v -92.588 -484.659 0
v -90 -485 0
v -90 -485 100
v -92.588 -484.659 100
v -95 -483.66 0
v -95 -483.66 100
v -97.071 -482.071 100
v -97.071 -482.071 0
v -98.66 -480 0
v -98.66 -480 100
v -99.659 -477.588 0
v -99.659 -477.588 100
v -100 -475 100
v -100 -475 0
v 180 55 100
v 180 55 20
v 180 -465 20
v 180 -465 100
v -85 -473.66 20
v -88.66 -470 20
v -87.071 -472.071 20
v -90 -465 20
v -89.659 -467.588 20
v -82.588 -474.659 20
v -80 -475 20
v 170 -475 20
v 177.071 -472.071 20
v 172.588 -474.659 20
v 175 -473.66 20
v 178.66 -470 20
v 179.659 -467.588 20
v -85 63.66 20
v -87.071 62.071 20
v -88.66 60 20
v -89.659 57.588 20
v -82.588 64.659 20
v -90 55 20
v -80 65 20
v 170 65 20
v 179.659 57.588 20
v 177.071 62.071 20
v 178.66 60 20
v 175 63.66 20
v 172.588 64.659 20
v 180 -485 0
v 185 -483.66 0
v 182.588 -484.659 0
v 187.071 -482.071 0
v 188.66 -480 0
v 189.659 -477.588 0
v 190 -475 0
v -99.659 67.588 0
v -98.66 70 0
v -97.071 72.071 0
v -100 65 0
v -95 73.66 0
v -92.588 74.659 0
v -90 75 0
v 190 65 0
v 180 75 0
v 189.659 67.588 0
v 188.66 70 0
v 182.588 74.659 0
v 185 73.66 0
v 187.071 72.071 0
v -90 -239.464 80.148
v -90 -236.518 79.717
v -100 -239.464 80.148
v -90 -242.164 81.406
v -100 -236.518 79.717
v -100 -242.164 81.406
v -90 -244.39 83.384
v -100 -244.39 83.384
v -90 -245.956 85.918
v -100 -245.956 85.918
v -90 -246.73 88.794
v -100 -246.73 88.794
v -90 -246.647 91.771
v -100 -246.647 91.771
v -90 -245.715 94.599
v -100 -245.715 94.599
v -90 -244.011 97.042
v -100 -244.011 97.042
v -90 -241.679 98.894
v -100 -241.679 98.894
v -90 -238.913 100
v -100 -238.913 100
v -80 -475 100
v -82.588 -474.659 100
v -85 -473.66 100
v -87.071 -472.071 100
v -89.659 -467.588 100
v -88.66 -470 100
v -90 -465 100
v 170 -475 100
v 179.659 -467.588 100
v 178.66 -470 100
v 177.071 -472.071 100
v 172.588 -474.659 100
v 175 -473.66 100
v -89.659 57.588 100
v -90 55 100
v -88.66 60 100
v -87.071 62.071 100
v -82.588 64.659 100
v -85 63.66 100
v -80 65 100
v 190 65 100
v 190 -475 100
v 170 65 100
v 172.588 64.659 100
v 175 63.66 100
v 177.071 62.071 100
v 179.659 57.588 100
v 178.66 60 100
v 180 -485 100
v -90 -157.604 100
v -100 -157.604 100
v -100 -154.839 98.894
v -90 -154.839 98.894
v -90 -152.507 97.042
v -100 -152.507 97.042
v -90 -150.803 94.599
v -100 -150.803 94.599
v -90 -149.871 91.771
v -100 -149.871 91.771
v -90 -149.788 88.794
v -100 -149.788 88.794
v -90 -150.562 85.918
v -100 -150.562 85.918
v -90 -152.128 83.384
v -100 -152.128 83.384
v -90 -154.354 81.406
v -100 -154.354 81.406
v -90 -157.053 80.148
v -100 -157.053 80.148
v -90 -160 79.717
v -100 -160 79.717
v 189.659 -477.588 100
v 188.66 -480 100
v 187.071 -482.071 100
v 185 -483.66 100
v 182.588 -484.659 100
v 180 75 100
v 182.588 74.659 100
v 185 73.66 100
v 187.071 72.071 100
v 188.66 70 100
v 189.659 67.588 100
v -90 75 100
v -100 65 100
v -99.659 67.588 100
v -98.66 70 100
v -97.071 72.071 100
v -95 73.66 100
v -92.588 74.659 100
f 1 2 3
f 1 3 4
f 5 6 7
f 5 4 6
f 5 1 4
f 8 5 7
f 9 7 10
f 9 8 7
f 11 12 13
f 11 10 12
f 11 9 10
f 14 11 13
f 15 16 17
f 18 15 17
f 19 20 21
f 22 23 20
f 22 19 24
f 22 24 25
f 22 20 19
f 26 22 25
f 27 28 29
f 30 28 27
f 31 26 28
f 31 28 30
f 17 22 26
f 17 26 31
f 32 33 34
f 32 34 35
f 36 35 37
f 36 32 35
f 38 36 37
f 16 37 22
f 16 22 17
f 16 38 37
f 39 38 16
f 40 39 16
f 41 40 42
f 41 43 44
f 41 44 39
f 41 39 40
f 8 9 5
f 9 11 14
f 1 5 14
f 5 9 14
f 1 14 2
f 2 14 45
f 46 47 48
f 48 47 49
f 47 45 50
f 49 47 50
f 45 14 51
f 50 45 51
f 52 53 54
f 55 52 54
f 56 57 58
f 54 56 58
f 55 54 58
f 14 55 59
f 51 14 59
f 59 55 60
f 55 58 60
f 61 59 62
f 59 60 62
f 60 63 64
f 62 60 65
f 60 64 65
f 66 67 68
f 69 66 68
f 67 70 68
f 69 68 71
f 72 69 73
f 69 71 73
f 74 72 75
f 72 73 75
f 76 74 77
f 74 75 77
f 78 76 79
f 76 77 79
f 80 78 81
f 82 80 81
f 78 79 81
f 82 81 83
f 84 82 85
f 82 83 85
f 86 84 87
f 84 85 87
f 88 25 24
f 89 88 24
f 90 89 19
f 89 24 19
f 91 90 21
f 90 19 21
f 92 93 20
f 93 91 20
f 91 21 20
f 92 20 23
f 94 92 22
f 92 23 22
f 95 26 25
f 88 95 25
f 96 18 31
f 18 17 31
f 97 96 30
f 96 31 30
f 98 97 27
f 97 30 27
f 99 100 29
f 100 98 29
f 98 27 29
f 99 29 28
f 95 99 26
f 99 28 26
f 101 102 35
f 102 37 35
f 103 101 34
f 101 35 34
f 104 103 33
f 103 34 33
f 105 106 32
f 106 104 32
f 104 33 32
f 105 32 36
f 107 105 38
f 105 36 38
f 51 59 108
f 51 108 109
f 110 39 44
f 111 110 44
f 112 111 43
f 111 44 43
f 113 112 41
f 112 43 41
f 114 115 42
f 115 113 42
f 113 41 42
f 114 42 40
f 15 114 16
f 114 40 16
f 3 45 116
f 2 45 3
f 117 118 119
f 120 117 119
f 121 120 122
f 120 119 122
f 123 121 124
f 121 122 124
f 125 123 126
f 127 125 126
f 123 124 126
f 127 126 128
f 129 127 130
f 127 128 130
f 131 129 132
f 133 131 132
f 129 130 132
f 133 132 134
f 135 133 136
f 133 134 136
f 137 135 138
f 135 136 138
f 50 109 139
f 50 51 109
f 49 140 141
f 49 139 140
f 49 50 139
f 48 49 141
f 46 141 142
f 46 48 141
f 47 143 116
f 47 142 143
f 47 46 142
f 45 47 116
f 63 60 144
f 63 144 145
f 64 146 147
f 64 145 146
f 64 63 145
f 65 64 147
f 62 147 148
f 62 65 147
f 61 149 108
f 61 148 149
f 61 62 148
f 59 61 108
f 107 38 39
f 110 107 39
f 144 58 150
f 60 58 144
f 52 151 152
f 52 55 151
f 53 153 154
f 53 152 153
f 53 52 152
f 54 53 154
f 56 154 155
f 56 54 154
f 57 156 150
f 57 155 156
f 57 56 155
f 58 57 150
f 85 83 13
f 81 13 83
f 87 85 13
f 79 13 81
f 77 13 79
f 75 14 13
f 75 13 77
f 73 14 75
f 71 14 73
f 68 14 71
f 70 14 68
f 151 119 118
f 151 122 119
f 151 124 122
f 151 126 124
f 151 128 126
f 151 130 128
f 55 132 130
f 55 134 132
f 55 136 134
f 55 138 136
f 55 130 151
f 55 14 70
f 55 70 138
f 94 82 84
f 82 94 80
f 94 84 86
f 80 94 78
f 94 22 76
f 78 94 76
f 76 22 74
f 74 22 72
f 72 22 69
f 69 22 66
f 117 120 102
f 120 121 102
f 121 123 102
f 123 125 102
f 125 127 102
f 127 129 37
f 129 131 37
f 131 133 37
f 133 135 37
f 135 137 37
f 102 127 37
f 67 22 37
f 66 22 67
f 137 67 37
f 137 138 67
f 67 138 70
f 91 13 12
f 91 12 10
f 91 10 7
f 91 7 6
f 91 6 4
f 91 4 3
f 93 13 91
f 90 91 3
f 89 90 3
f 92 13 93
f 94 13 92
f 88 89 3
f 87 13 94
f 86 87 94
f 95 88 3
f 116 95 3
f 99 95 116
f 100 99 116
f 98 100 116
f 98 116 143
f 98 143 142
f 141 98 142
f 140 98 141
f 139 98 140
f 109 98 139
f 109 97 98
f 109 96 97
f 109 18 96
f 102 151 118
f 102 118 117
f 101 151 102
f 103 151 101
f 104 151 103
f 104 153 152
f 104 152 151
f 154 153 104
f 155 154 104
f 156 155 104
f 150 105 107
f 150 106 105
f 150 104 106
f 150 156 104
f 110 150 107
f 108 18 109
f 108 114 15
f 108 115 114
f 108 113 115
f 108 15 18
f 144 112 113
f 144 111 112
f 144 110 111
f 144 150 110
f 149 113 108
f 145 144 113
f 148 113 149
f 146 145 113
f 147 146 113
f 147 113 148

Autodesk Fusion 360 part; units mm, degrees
sketch "Sketch1" plane through (0, 0, 0) normal (0, 0, 1) x (1, 0, 0)
  line L0 (-90, 75) -> (180, 75)
  line L1 (190, 65) -> (190, -475)
  line L2 (180, -485) -> (-90, -485)
  line L3 (-100, -475) -> (-100, 65)
  line L4 (170, -475) -> (-80, -475)
  line L5 (-90, -465) -> (-90, 55)
  line L6 (-80, 65) -> (170, 65)
  line L7 (180, 55) -> (180, -465)
  arc A0 (190, 65) -> (180, 75) centre (180, 65) ccw
  arc A1 (180, 55) -> (170, 65) centre (170, 55) ccw
  arc A2 (-80, 65) -> (-90, 55) centre (-80, 55) ccw
  arc A3 (180, -485) -> (190, -475) centre (180, -475) ccw
  arc A4 (-90, 75) -> (-100, 65) centre (-90, 65) ccw
  arc A5 (170, -475) -> (180, -465) centre (170, -465) ccw
  arc A6 (-90, -465) -> (-80, -475) centre (-80, -465) ccw
  arc A7 (-100, -475) -> (-90, -485) centre (-90, -475) ccw
  point P0 (-100, 75)
  point P1 (190, 75)
  point P2 (-100, -485)
  dimension "d1" = 290
  dimension "d2" = 560
  dimension "d4" = 10
  dimension "d5" = 10
extrude "Extrude1" add sketch "Sketch1" along normal blind 100
extrude "Extrude2" add sketch "Sketch1" along normal blind 20 contours L4 L5 L6 L7 A1 A2 A5 A6
sketch "Sketch2" plane through (-100, 0, 0) normal (-1, 0, 0) x (0, -1, 0)
  line L0 (-65, 0) -> (475, 0)
  line L1 (475, 0) -> (475, 100)
  line L2 (475, 100) -> (-65, 100)
  line L3 (-65, 100) -> (-65, 0)
  line L4 (160, 79.717) -> (236.5175, 79.717)
  arc A0 (236.5175, 79.717) -> (236.5175, 100.283) centre (236.5175, 90) ccw
  line L5 (236.5175, 100.283) -> (160, 100.283)
  arc A1 (160, 100.283) -> (160, 79.717) centre (160, 90) ccw
  line L6 (160, 90) -> (236.5175, 90) construction
extrude "Extrude3" cut sketch "Sketch2" against normal blind 40 contours L2 L4 A0 A1
